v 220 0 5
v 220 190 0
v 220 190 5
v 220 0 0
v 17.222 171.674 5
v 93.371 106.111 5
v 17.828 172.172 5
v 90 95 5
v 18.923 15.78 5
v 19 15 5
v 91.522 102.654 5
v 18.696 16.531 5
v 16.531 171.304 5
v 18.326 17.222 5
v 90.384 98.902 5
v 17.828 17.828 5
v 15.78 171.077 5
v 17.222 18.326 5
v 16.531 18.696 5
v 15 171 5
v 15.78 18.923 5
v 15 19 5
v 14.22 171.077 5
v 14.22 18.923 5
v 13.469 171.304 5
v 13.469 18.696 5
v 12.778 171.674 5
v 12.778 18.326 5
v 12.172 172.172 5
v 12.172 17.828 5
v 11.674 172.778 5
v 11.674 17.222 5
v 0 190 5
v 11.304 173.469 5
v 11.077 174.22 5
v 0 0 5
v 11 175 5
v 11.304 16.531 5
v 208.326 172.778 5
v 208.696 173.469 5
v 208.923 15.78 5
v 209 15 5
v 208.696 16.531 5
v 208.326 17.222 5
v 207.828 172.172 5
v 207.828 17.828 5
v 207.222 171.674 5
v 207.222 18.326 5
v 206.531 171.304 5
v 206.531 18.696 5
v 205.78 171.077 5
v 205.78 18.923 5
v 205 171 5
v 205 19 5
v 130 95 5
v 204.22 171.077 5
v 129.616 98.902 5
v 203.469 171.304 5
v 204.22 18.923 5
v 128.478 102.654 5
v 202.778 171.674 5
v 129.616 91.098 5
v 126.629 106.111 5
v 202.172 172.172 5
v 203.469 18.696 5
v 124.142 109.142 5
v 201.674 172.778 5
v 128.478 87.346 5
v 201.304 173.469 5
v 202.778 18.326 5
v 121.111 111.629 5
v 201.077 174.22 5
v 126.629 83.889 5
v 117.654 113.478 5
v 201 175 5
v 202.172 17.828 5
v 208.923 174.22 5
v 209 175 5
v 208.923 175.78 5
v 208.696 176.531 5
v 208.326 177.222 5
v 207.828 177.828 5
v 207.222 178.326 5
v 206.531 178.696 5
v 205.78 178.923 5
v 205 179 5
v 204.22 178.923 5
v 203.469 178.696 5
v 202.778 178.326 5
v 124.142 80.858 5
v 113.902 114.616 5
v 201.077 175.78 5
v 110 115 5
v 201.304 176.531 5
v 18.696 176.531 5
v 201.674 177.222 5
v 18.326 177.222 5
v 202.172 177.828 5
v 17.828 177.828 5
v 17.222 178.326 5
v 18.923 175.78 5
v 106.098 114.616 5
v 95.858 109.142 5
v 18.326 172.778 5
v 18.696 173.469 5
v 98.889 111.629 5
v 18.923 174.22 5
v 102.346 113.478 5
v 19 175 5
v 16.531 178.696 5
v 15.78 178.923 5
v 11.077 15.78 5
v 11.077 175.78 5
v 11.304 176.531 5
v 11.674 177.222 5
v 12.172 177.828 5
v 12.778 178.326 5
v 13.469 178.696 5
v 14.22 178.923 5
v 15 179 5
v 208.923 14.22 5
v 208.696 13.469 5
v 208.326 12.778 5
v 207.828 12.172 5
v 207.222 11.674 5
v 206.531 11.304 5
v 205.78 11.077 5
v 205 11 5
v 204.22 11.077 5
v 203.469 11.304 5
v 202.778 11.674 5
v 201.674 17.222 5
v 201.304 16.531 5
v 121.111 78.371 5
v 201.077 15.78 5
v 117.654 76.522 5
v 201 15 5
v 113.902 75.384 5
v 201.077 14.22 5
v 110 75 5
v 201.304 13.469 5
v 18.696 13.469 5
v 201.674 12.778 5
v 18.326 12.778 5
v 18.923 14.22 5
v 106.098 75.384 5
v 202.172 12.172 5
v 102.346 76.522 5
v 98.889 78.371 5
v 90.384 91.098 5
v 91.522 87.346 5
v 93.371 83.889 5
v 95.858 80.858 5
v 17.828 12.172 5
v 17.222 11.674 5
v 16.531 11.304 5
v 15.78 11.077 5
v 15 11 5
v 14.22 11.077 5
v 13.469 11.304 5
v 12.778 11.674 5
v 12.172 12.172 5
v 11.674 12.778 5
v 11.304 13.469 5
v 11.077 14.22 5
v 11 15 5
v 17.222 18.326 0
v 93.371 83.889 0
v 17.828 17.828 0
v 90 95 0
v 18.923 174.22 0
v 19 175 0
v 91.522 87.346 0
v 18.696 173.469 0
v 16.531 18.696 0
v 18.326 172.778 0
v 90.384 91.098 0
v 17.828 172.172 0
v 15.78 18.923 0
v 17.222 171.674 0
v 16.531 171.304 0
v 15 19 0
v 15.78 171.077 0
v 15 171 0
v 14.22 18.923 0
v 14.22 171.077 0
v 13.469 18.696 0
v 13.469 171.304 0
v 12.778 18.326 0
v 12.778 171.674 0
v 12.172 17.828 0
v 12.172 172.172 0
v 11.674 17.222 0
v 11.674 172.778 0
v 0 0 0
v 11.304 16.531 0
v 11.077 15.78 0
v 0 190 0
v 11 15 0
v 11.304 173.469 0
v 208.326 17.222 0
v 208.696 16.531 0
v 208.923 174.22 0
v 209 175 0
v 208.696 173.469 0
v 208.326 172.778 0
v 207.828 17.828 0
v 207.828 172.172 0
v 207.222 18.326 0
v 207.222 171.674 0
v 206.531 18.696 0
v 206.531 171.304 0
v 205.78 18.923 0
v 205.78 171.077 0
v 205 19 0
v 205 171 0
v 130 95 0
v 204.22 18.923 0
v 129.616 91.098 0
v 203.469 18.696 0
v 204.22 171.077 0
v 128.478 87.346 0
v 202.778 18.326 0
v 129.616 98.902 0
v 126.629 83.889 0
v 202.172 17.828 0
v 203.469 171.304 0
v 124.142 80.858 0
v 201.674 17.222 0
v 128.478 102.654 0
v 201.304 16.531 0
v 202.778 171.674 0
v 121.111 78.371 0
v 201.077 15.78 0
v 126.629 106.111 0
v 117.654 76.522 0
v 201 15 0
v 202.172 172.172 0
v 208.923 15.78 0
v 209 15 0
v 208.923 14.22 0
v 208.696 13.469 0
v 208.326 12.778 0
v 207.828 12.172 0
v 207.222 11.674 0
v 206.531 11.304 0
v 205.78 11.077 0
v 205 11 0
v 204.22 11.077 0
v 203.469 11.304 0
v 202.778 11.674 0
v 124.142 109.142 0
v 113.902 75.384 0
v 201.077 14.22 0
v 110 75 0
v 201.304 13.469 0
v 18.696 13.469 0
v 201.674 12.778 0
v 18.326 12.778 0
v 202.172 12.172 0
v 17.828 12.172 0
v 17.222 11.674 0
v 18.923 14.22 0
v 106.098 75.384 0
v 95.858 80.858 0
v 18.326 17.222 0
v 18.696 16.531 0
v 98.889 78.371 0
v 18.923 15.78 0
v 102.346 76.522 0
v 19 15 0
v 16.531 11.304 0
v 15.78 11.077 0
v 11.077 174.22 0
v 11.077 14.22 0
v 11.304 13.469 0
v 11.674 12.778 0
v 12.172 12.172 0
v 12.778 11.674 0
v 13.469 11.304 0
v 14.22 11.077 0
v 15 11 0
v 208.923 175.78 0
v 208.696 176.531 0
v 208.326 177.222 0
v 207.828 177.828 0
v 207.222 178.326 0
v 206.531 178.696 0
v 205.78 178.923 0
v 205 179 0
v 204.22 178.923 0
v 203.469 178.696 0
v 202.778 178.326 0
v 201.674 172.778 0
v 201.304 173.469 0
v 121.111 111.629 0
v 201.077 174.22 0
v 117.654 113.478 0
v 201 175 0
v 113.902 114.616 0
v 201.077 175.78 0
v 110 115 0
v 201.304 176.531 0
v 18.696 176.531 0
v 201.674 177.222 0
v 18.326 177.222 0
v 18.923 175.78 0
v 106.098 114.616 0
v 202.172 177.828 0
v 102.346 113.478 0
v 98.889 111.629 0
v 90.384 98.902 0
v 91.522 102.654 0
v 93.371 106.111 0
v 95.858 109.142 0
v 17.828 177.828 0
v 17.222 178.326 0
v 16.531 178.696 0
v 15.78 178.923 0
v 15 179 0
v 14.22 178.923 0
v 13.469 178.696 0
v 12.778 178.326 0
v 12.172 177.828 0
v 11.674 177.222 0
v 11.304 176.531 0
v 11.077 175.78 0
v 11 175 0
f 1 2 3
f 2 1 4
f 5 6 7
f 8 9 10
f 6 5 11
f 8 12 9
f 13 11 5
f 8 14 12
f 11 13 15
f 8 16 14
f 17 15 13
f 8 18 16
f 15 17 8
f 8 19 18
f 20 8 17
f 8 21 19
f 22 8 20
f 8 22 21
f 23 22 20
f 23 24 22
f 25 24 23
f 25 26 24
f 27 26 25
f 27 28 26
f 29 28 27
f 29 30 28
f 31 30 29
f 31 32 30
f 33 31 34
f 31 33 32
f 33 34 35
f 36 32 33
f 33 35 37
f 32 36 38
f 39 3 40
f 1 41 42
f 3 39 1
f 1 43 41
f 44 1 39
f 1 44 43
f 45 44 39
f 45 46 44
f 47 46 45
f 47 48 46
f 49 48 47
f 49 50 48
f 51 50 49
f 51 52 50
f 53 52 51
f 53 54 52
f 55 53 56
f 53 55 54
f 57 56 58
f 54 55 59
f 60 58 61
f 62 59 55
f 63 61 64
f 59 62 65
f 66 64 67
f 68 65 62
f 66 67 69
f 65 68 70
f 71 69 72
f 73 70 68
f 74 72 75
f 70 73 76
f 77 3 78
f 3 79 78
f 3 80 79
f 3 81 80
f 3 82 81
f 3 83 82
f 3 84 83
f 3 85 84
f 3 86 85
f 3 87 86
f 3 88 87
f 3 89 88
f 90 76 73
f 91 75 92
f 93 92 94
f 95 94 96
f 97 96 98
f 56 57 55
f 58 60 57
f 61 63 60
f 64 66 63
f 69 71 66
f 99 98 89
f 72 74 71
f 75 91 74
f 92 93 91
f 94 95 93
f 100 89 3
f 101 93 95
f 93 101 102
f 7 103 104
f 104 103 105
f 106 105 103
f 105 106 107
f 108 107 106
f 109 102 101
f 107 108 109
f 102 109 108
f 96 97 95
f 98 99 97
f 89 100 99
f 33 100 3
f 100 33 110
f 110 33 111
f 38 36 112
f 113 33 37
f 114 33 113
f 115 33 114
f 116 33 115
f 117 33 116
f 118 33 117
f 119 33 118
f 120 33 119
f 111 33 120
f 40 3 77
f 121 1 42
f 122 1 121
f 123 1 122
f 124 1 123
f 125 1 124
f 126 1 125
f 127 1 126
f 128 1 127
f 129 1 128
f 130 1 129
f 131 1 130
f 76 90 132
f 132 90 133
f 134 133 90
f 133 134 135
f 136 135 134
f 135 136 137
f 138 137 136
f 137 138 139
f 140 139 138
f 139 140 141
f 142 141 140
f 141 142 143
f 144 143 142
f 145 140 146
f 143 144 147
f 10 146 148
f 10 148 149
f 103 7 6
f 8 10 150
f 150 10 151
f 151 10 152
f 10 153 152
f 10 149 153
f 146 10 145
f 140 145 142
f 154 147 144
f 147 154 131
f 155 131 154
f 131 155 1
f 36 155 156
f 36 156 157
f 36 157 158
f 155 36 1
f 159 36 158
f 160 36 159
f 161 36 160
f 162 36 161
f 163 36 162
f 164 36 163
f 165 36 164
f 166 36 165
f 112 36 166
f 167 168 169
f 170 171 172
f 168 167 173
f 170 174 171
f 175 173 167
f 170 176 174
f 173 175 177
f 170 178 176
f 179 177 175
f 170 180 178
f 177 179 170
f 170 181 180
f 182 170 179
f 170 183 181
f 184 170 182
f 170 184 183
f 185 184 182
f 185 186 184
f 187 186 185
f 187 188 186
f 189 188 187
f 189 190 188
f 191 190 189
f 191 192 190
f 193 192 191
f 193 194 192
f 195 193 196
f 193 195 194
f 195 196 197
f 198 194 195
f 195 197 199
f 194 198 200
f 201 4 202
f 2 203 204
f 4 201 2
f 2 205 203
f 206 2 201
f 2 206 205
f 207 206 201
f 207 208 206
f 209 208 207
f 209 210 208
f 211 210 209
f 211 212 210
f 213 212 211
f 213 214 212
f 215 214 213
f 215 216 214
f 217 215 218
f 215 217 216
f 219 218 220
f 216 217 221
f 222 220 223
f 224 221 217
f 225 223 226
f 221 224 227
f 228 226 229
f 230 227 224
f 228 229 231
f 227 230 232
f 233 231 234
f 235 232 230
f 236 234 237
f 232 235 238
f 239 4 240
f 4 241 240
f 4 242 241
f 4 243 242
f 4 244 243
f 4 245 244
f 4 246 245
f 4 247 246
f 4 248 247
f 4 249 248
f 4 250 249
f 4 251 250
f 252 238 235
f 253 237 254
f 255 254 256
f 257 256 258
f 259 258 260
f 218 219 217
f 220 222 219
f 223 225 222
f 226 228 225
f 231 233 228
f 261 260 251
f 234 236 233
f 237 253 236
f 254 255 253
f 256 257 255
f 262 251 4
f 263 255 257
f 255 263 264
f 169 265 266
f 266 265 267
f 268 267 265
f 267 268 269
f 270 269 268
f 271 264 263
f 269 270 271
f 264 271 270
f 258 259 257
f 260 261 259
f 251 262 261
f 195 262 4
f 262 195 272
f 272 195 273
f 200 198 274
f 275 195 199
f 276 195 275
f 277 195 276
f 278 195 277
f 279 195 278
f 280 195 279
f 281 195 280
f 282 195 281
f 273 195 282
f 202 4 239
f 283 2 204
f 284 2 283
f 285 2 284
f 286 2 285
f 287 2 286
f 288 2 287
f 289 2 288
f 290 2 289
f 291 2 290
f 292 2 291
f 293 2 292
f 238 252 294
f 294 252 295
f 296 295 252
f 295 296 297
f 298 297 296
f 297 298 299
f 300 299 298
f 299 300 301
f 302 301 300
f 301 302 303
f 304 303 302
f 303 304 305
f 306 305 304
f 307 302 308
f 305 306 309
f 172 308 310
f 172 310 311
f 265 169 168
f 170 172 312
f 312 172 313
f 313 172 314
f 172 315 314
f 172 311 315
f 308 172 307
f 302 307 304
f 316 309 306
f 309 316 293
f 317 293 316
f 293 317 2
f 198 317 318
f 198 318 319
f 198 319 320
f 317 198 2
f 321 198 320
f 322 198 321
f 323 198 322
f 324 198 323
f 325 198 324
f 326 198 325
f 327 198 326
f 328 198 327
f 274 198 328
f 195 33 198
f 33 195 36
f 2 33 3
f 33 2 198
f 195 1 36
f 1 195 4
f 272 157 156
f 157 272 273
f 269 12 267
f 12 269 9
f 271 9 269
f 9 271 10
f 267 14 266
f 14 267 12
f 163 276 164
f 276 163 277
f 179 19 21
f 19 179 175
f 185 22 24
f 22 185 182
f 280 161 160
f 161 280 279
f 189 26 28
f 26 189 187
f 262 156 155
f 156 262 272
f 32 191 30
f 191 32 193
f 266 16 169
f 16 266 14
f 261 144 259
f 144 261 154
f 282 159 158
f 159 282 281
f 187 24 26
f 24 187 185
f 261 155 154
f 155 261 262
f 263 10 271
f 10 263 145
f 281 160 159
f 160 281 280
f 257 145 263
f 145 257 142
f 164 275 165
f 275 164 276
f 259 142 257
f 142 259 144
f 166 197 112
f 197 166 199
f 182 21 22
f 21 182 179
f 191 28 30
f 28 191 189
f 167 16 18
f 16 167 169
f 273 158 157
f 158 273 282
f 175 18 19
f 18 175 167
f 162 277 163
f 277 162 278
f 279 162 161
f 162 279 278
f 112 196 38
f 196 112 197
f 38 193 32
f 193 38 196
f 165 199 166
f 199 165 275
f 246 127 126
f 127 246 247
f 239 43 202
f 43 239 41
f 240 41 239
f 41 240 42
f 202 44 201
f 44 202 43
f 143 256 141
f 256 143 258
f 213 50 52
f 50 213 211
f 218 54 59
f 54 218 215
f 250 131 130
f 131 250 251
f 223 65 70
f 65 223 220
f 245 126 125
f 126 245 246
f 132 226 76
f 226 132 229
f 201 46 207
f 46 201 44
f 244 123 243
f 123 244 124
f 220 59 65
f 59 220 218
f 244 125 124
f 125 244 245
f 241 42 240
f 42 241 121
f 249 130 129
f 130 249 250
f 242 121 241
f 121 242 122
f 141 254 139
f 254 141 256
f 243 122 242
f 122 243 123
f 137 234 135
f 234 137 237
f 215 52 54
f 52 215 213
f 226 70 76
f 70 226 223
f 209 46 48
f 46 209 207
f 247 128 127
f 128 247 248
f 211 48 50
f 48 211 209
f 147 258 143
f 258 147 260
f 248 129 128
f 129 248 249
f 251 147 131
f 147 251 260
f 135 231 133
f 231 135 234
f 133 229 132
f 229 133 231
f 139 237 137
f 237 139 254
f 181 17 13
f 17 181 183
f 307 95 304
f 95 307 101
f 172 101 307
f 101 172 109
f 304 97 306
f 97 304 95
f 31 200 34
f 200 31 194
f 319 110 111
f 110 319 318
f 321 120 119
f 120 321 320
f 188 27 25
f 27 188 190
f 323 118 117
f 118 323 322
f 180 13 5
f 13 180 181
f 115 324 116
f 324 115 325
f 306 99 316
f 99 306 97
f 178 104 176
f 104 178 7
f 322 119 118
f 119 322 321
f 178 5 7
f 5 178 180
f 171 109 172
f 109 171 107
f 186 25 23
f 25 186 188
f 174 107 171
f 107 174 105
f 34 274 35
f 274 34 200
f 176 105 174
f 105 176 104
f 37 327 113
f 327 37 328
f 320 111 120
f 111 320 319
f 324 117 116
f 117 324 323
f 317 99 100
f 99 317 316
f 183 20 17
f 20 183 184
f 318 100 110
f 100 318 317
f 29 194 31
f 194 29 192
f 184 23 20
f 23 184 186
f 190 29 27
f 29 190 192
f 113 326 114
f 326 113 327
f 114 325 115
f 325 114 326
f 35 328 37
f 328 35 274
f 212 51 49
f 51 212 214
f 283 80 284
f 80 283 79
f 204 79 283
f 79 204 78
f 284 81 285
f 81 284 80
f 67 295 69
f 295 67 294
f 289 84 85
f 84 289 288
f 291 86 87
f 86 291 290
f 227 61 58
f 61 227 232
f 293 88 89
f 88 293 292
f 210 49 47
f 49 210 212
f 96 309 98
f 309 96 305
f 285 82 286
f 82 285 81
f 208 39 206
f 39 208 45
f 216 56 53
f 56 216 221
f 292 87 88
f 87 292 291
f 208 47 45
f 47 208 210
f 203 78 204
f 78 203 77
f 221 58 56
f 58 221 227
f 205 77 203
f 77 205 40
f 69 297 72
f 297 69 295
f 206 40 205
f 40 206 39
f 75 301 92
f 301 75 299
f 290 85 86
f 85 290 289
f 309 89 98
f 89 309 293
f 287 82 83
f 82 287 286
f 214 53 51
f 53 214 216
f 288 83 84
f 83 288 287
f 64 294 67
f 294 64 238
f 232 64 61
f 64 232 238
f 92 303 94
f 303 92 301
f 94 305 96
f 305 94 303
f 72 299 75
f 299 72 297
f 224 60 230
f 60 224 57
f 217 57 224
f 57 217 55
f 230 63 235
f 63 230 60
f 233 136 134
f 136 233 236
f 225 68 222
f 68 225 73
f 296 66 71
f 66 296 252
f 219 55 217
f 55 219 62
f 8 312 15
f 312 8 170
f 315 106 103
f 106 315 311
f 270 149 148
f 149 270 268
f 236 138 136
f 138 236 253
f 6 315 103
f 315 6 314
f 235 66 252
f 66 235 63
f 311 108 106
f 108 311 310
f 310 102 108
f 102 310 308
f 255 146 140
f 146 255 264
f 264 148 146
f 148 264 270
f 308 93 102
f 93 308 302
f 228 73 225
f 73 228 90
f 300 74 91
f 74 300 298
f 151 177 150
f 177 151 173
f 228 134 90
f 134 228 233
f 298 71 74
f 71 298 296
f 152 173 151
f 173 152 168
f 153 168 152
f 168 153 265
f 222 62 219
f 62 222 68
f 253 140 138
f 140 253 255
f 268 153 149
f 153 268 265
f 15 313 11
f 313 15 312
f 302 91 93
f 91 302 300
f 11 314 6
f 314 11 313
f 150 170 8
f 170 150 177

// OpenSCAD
$fn = 32;

// ----------------------------------------------------------------------
// Big plate: 200-250 mm adapter plate
// ----------------------------------------------------------------------

// --- parameters (mm) ---
plate_l = 220;            // plate length, X
plate_w = 190;            // plate width, Y
plate_t = 5;              // plate thickness, Z
corner_d = 8;             // corner hole diameter
corner_in = 15;           // corner hole inset from the edges
bore_d = 40;              // central bore
fit_tol = 0.05;           // tolerance for press fits, mm
free_tol = 0.3;           // tolerance for clearance fits, mm

difference() {
  cube([plate_l, plate_w, plate_t]);
  translate([corner_in, corner_in, -1]) cylinder(h = plate_t + 2, d = corner_d);
  translate([plate_l - corner_in, corner_in, -1]) cylinder(h = plate_t + 2, d = corner_d);
  translate([corner_in, plate_w - corner_in, -1]) cylinder(h = plate_t + 2, d = corner_d);
  translate([plate_l - corner_in, plate_w - corner_in, -1]) cylinder(h = plate_t + 2, d = corner_d);
  translate([plate_l / 2, plate_w / 2, -1]) cylinder(h = plate_t + 2, d = bore_d);
}
